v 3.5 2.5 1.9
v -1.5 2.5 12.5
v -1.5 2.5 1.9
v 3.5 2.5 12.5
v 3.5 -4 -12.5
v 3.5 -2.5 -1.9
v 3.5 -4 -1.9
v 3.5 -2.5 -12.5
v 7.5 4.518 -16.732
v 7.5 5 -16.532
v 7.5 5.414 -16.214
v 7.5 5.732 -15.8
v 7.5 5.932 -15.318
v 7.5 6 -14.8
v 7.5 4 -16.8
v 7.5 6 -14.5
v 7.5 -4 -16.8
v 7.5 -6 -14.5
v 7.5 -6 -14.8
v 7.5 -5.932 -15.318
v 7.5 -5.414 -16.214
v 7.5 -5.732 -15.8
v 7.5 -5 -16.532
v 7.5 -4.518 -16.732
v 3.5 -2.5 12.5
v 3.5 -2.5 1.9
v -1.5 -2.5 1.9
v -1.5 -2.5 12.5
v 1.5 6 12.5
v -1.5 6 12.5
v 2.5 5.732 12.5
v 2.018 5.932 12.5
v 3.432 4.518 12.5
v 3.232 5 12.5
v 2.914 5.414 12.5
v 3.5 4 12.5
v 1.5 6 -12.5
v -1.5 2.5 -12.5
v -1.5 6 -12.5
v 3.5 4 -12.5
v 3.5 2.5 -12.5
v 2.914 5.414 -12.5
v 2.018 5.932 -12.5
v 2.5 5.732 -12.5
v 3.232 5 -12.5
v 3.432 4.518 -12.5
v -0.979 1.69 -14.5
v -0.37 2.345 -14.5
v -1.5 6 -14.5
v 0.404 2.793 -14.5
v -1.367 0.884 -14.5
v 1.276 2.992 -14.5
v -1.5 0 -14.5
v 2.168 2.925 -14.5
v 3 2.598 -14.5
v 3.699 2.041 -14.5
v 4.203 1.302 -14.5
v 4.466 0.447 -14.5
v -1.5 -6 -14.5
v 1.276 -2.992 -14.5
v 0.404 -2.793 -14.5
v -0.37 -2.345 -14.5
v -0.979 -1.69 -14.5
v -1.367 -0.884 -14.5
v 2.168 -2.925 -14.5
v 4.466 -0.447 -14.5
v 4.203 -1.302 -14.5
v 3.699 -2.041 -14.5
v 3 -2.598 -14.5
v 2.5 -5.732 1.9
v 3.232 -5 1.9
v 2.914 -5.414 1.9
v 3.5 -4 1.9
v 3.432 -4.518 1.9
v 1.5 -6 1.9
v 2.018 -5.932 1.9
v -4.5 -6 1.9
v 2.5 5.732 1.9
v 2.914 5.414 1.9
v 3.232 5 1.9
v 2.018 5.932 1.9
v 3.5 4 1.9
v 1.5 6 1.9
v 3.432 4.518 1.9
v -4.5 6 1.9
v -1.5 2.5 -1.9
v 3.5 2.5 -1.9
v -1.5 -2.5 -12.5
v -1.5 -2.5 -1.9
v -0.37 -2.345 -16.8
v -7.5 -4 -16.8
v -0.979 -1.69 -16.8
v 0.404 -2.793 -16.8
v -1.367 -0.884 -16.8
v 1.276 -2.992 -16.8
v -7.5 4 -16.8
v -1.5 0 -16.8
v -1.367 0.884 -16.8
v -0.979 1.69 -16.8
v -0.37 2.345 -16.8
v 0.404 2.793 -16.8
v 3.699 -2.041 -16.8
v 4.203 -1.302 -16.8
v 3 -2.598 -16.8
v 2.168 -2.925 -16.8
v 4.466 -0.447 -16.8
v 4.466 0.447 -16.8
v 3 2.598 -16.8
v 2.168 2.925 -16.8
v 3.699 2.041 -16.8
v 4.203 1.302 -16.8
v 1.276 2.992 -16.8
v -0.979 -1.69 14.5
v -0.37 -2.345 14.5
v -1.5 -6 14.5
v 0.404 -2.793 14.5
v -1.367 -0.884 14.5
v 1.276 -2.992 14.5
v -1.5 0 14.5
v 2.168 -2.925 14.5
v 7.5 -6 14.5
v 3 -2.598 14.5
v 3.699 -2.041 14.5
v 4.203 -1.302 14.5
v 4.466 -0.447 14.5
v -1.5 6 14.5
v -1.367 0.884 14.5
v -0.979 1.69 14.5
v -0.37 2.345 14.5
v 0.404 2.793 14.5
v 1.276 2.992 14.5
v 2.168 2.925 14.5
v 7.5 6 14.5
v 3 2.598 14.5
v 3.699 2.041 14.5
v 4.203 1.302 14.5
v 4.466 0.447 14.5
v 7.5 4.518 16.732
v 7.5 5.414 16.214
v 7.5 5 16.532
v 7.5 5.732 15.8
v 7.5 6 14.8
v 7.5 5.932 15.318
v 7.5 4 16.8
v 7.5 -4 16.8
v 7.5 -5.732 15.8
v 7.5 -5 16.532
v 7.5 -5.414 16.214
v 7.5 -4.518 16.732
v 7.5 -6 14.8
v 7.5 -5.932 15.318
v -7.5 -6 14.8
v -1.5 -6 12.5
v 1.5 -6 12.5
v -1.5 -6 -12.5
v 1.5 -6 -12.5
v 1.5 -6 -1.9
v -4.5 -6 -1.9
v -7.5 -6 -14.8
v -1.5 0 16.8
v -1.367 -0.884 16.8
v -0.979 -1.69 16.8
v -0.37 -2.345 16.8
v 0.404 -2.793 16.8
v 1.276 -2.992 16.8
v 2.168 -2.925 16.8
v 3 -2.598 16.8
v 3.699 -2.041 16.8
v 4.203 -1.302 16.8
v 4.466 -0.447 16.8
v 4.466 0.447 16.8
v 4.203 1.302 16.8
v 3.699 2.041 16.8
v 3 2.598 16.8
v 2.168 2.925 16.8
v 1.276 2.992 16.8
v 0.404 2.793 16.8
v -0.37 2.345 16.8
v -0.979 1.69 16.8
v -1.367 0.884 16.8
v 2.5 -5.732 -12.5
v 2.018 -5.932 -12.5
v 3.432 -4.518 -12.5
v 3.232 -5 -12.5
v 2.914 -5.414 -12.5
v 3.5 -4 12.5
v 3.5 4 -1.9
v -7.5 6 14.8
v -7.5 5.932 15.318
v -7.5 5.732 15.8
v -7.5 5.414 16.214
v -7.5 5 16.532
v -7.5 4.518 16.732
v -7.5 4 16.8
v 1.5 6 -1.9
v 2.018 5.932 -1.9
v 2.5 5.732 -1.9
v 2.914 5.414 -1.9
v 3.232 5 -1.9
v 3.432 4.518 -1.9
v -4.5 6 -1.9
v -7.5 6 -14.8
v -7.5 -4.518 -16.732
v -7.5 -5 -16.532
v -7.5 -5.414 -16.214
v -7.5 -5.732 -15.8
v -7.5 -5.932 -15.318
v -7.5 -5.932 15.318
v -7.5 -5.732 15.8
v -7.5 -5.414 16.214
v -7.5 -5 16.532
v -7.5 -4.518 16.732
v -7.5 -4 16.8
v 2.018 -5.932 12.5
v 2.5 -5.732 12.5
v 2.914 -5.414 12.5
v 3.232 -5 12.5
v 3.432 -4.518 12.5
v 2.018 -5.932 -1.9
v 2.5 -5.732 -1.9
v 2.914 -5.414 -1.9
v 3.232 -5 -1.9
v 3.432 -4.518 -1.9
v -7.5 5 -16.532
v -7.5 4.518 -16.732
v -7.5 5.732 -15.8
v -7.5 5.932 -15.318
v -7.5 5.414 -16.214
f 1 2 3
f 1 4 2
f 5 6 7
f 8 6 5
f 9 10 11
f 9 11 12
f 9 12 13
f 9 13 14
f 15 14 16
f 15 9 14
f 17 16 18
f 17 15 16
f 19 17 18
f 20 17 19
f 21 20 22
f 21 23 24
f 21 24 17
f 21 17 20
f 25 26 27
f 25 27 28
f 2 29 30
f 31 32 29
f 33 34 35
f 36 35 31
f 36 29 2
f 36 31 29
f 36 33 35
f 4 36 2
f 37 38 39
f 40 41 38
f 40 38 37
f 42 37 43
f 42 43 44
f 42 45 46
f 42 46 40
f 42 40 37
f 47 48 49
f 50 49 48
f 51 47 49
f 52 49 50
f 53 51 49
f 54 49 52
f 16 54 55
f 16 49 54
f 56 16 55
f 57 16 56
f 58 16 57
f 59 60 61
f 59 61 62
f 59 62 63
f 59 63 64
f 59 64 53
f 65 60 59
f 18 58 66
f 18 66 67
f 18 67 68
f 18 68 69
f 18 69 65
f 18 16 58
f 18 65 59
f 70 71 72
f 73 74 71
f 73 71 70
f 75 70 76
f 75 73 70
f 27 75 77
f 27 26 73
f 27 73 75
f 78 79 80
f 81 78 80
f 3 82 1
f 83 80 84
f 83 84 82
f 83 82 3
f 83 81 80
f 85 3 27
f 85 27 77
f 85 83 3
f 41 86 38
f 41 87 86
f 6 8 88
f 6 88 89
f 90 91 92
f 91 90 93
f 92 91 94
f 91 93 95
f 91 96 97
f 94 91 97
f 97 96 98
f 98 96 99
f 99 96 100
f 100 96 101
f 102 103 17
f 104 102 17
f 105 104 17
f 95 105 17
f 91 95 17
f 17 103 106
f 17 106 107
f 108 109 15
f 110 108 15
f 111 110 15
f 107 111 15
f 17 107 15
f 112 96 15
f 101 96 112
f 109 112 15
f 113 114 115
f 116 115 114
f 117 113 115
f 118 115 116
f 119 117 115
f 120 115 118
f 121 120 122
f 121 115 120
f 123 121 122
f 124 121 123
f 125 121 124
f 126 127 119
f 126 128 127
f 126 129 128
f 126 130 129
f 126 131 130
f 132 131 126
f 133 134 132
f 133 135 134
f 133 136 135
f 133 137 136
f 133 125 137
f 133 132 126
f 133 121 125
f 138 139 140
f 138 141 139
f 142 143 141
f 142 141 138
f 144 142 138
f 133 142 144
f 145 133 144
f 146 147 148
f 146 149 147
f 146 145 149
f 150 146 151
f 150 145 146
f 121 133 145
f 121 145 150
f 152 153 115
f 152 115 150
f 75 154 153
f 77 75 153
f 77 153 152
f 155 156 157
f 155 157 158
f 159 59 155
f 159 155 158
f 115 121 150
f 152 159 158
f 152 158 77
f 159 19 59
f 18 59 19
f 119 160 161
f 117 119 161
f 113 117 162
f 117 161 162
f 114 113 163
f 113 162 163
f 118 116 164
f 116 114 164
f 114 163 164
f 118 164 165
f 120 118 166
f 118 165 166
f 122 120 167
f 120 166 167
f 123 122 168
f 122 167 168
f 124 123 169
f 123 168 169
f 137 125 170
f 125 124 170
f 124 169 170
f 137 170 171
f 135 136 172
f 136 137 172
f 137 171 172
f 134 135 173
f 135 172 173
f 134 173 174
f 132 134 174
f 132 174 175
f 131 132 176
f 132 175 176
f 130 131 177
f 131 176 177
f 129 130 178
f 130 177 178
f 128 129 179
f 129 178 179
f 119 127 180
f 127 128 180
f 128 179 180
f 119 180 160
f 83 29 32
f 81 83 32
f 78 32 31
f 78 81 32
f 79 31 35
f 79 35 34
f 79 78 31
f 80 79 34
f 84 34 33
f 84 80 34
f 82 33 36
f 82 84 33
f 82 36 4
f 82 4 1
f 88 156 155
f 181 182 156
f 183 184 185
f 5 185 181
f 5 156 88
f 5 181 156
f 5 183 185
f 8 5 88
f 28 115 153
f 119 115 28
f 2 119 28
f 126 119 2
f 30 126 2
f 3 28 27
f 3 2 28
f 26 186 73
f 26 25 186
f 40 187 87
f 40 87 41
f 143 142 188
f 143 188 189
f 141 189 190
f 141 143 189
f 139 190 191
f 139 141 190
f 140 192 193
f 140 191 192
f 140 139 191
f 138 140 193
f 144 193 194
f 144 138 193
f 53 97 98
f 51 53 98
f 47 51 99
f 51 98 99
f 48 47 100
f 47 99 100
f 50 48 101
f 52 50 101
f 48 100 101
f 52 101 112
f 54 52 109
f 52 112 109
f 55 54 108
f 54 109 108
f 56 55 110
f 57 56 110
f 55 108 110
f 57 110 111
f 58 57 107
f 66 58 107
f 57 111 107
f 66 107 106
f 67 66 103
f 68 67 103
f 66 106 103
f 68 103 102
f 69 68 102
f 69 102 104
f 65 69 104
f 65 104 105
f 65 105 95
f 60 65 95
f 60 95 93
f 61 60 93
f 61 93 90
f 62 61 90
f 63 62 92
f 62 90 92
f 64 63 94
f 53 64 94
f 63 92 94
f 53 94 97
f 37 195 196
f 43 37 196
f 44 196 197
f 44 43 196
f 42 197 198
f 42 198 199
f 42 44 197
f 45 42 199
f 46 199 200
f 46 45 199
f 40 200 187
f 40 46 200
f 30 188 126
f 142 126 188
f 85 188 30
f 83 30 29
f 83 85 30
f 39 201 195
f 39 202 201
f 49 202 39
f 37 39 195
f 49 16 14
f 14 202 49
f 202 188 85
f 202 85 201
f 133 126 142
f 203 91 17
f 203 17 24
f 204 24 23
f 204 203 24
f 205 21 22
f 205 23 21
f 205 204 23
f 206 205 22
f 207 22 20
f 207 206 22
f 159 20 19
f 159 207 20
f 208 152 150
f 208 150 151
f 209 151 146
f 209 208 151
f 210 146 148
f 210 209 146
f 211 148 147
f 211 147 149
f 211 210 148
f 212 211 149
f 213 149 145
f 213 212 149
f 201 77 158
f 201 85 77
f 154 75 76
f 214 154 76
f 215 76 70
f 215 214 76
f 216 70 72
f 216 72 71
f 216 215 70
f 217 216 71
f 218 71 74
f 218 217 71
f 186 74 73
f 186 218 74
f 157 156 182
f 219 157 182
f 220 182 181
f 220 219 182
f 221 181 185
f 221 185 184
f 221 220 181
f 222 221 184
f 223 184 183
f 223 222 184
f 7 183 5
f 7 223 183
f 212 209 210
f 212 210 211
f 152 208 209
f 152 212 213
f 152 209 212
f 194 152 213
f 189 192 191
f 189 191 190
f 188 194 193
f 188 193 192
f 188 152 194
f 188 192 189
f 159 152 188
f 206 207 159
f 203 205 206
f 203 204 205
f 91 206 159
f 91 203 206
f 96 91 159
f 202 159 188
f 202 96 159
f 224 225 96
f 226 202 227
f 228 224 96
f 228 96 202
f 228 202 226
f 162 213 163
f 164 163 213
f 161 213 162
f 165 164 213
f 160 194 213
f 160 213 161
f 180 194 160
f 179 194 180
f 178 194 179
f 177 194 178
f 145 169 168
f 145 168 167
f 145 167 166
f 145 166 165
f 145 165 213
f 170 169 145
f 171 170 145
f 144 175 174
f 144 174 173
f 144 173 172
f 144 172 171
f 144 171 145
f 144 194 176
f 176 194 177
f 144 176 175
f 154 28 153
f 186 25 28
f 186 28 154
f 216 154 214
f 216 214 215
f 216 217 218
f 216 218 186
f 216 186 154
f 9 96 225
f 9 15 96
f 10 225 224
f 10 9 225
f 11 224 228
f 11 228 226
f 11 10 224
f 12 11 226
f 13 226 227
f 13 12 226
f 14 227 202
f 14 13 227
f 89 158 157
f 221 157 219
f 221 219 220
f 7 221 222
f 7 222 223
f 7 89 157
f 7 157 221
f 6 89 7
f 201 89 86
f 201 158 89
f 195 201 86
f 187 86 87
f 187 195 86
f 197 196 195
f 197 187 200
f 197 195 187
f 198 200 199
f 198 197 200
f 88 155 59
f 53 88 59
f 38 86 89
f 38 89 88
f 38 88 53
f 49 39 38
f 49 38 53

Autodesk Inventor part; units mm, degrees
ref_plane "YZ Plane" through (0, 0, 0) normal (1, 0, 0) x (0, 1, 0)
ref_plane "XZ Plane" through (0, 0, 0) normal (0, 1, 0) x (-1, 0, 0)
ref_plane "XY Plane" through (0, 0, 0) normal (0, 0, 1) x (1, 0, 0)
sketch "スケッチ1" plane through (0, 0, 0) normal (0, 0, 1) x (1, 0, 0)
  line L0 (7.5, -6) -> (-7.5, -6)
  line L1 (-7.5, -6) -> (-7.5, 6)
  line L2 (-7.5, 6) -> (7.5, 6)
  line L3 (7.5, 6) -> (7.5, -6)
  line L4 (7.5, -6) -> (-7.5, 6) construction
  line L5 (-7.5, -6) -> (7.5, 6) construction
  point P0 (0, 0)
  point P1 (0, 0)
  point P2 (0, 0)
  dimension "d2" = 15
  dimension "d4" = 12
extrude "押し出し1" add sketch "スケッチ1" along normal mid plane 33.6
sketch "スケッチ3" plane through (7.5, -6, -16.8) normal (1, 0, 0) x (0, 0, -1)
  line L0 (-29.3, 8.5) -> (-4.3, 8.5)
  line L1 (-4.3, 8.5) -> (-4.3, 3.5)
  line L2 (-4.3, 3.5) -> (-29.3, 3.5)
  line L3 (-29.3, 3.5) -> (-29.3, 8.5)
  line L4 (-29.3, 8.5) -> (-4.3, 3.5) construction
  line L5 (-4.3, 8.5) -> (-29.3, 3.5) construction
  line L6 (-31.3, 12) -> (-29.3, 12)
  line L7 (-29.3, 12) -> (-29.3, 0)
  line L8 (-29.3, 0) -> (-31.3, 0)
  line L9 (-31.3, 0) -> (-31.3, 12)
  line L10 (0, 0) -> (-33.6, 0) projected
  line L11 (-2.3, 12) -> (-2.3, 0)
  line L12 (-4.3, 0) -> (-4.3, 12)
  line L13 (-2.3, 0) -> (-4.3, 0)
  line L14 (-4.3, 12) -> (-2.3, 12)
  point P0 (-16.8, 6)
  point P1 (-16.8, 6)
  point P2 (-16.8, 6)
  point P3 (-29.3, 6)
  point P4 (-30.3, 0)
  point P5 (-18.35, 0)
  point P6 (-4.3, 6)
  point P7 (-3.3, 12)
  point P8 (-4.3, 3.5)
  dimension "d11" = 25
  dimension "d14" = 12
  dimension "d15" = 2
  dimension "d18" = 360
  dimension "d26" = 5
extrude "押し出し3" cut sketch "スケッチ3" against normal blind 9 contours L0 L1 L2 L3 | L3 L7 L8 L9 L6 | L12 L14 L11 L10 L1
sketch "スケッチ4" plane through (0, 0, -16.8) normal (0, 0, -1) x (-1, 0, 0)
  circle A0 centre (-1.5, 0) radius 3
  line L0 (-7.5, 6) -> (-7.5, -6) projected
  point P0 (0, 0)
  dimension "d22" = 6
  dimension "d23" = 6
extrude "押し出し4" cut sketch "スケッチ4" against normal up to surface (2.3 mm away)
mirror "ミラー1" about plane through (0, 0, 0) normal (0, 0, 1) of "押し出し4"
sketch "スケッチ5" plane through (-7.5, 6, -16.8) normal (0, 1, 0) x (1, 0, 0)
  line L0 (15, -4.3) -> (15, -29.3) projected
  line L1 (6, -4.3) -> (15, -4.3) projected
  line L2 (15, -29.3) -> (11, -29.3)
  line L3 (11, -29.3) -> (11, -4.3)
  line L4 (11, -4.3) -> (15, -4.3)
  line L5 (15, -4.3) -> (15, -29.3)
  line L6 (11, -18.7) -> (3, -18.7)
  line L7 (3, -18.7) -> (3, -14.9)
  line L8 (3, -14.9) -> (11, -14.9)
  line L9 (11, -14.9) -> (11, -18.7)
  point P0 (11, -16.8)
  point P1 (11, -16.8)
  dimension "d30" = 4
  dimension "d36" = 8
  dimension "d37" = 3.8
extrude "押し出し5" cut sketch "スケッチ5" against normal through all
fillet "フィレット4" radius 2 8 edges at (0, 6, -16.8) (0, -6, -16.8) (0, 6, 16.8) (0, -6, 16.8) (3.5, 6, 7.2) (3.5, 6, -7.2) (3.5, -6, -7.2) (3.5, -6, 7.2)
properties part number "Cable_fixing" material "熱可塑性 樹脂"
